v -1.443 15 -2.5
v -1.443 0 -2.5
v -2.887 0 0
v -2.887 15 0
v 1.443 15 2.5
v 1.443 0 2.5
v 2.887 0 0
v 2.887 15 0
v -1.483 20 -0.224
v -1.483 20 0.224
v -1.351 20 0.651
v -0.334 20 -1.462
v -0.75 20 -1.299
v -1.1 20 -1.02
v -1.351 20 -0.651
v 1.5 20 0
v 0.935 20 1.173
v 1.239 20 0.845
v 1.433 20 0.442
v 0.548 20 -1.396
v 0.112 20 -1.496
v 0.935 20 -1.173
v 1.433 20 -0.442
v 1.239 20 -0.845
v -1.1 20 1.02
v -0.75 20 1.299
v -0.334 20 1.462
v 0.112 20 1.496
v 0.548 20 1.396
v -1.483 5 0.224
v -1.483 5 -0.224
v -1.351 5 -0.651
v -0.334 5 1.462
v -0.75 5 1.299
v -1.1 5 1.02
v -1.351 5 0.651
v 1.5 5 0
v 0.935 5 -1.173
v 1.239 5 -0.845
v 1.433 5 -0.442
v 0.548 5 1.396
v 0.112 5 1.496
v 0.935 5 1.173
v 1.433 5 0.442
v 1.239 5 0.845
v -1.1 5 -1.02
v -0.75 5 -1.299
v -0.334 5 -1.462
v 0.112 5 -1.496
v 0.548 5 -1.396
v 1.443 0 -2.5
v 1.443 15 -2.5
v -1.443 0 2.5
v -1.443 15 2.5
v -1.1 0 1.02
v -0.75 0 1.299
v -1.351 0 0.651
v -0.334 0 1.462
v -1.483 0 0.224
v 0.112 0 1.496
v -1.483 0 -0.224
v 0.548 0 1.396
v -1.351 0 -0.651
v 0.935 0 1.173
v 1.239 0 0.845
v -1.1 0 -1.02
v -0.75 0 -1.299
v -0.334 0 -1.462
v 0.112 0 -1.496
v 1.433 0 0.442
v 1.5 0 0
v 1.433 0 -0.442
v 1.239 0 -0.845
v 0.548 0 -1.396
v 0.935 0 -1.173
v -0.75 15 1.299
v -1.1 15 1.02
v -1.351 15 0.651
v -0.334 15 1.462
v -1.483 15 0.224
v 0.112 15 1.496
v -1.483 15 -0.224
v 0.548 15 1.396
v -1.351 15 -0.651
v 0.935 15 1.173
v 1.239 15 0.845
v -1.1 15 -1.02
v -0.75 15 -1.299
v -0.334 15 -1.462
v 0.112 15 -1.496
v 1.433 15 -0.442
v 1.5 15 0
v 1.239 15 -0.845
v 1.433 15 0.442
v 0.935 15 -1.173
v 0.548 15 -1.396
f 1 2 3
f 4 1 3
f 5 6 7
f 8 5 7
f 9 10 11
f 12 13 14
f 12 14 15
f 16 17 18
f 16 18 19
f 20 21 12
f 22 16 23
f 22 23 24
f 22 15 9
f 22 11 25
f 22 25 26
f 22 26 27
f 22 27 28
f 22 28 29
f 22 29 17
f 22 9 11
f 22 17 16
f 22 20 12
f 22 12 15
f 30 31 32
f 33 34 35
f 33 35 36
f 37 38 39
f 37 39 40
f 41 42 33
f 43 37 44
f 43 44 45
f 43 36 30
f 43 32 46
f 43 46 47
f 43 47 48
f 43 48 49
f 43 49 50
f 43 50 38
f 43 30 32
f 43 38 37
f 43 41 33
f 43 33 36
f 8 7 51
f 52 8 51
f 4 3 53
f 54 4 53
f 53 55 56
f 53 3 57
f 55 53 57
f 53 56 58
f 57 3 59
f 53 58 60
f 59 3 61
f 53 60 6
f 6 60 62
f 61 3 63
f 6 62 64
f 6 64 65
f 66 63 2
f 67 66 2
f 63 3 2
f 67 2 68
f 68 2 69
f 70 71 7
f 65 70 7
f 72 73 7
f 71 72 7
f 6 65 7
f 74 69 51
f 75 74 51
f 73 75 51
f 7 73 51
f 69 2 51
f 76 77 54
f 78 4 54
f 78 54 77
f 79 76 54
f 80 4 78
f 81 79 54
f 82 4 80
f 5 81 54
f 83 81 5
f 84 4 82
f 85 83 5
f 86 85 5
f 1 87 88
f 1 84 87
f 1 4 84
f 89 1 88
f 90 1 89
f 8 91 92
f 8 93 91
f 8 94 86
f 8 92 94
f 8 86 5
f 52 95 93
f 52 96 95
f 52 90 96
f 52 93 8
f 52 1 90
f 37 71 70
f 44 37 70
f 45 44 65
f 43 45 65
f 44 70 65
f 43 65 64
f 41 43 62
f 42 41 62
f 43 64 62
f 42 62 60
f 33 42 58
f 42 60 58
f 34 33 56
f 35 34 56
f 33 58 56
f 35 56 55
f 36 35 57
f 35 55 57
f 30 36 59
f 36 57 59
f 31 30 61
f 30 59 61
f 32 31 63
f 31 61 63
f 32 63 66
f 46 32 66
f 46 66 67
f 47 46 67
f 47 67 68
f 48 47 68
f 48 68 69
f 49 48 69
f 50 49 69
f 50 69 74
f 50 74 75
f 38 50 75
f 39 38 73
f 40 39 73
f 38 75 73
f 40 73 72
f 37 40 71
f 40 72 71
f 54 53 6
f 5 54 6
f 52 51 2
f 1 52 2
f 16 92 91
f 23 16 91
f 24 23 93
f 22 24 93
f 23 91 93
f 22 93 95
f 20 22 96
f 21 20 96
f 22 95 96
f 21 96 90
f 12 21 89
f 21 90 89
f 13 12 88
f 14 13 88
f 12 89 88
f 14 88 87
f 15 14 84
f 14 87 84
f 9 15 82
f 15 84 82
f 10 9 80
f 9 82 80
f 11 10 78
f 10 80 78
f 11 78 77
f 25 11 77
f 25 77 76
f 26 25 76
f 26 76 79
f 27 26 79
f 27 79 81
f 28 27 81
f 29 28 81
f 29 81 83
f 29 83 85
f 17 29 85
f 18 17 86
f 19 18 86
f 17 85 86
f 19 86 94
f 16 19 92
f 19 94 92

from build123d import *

# Parameters (mm, degrees)
EXTRUDE_1_DEPTH     = 15
SKETCH_2_R          = 1.5
EXTRUDE_2_DEPTH     = 5
SKETCH_3_R          = 1.5
CUT_EXTRUDE_1_DEPTH = 5


with BuildPart() as part:
    # 草圖1 → 填料-伸長1 (new body)
    with BuildSketch(Plane(origin=(0, 0, 0), x_dir=(1, 0, 0), z_dir=(0, 1, 0))):
        Polygon((2.886751346, 0), (1.443375673, 2.5), (-1.443375673, 2.5), (-2.886751346, 0), (-1.443375673, -2.5), (1.443375673, -2.5), align=None)
    extrude(amount=EXTRUDE_1_DEPTH)

    # 草圖2 → 填料-伸長2 (add)
    with BuildSketch(Plane(origin=(0, 15, 0), x_dir=(1, 0, 0), z_dir=(0, 1, 0))):
        Circle(SKETCH_2_R)
    extrude(amount=EXTRUDE_2_DEPTH)

    # 草圖3 → 除料-伸長1 (cut)
    with BuildSketch(Plane.XZ):
        Circle(SKETCH_3_R)
    extrude(amount=-CUT_EXTRUDE_1_DEPTH, mode=Mode.SUBTRACT)


solid = part.part
